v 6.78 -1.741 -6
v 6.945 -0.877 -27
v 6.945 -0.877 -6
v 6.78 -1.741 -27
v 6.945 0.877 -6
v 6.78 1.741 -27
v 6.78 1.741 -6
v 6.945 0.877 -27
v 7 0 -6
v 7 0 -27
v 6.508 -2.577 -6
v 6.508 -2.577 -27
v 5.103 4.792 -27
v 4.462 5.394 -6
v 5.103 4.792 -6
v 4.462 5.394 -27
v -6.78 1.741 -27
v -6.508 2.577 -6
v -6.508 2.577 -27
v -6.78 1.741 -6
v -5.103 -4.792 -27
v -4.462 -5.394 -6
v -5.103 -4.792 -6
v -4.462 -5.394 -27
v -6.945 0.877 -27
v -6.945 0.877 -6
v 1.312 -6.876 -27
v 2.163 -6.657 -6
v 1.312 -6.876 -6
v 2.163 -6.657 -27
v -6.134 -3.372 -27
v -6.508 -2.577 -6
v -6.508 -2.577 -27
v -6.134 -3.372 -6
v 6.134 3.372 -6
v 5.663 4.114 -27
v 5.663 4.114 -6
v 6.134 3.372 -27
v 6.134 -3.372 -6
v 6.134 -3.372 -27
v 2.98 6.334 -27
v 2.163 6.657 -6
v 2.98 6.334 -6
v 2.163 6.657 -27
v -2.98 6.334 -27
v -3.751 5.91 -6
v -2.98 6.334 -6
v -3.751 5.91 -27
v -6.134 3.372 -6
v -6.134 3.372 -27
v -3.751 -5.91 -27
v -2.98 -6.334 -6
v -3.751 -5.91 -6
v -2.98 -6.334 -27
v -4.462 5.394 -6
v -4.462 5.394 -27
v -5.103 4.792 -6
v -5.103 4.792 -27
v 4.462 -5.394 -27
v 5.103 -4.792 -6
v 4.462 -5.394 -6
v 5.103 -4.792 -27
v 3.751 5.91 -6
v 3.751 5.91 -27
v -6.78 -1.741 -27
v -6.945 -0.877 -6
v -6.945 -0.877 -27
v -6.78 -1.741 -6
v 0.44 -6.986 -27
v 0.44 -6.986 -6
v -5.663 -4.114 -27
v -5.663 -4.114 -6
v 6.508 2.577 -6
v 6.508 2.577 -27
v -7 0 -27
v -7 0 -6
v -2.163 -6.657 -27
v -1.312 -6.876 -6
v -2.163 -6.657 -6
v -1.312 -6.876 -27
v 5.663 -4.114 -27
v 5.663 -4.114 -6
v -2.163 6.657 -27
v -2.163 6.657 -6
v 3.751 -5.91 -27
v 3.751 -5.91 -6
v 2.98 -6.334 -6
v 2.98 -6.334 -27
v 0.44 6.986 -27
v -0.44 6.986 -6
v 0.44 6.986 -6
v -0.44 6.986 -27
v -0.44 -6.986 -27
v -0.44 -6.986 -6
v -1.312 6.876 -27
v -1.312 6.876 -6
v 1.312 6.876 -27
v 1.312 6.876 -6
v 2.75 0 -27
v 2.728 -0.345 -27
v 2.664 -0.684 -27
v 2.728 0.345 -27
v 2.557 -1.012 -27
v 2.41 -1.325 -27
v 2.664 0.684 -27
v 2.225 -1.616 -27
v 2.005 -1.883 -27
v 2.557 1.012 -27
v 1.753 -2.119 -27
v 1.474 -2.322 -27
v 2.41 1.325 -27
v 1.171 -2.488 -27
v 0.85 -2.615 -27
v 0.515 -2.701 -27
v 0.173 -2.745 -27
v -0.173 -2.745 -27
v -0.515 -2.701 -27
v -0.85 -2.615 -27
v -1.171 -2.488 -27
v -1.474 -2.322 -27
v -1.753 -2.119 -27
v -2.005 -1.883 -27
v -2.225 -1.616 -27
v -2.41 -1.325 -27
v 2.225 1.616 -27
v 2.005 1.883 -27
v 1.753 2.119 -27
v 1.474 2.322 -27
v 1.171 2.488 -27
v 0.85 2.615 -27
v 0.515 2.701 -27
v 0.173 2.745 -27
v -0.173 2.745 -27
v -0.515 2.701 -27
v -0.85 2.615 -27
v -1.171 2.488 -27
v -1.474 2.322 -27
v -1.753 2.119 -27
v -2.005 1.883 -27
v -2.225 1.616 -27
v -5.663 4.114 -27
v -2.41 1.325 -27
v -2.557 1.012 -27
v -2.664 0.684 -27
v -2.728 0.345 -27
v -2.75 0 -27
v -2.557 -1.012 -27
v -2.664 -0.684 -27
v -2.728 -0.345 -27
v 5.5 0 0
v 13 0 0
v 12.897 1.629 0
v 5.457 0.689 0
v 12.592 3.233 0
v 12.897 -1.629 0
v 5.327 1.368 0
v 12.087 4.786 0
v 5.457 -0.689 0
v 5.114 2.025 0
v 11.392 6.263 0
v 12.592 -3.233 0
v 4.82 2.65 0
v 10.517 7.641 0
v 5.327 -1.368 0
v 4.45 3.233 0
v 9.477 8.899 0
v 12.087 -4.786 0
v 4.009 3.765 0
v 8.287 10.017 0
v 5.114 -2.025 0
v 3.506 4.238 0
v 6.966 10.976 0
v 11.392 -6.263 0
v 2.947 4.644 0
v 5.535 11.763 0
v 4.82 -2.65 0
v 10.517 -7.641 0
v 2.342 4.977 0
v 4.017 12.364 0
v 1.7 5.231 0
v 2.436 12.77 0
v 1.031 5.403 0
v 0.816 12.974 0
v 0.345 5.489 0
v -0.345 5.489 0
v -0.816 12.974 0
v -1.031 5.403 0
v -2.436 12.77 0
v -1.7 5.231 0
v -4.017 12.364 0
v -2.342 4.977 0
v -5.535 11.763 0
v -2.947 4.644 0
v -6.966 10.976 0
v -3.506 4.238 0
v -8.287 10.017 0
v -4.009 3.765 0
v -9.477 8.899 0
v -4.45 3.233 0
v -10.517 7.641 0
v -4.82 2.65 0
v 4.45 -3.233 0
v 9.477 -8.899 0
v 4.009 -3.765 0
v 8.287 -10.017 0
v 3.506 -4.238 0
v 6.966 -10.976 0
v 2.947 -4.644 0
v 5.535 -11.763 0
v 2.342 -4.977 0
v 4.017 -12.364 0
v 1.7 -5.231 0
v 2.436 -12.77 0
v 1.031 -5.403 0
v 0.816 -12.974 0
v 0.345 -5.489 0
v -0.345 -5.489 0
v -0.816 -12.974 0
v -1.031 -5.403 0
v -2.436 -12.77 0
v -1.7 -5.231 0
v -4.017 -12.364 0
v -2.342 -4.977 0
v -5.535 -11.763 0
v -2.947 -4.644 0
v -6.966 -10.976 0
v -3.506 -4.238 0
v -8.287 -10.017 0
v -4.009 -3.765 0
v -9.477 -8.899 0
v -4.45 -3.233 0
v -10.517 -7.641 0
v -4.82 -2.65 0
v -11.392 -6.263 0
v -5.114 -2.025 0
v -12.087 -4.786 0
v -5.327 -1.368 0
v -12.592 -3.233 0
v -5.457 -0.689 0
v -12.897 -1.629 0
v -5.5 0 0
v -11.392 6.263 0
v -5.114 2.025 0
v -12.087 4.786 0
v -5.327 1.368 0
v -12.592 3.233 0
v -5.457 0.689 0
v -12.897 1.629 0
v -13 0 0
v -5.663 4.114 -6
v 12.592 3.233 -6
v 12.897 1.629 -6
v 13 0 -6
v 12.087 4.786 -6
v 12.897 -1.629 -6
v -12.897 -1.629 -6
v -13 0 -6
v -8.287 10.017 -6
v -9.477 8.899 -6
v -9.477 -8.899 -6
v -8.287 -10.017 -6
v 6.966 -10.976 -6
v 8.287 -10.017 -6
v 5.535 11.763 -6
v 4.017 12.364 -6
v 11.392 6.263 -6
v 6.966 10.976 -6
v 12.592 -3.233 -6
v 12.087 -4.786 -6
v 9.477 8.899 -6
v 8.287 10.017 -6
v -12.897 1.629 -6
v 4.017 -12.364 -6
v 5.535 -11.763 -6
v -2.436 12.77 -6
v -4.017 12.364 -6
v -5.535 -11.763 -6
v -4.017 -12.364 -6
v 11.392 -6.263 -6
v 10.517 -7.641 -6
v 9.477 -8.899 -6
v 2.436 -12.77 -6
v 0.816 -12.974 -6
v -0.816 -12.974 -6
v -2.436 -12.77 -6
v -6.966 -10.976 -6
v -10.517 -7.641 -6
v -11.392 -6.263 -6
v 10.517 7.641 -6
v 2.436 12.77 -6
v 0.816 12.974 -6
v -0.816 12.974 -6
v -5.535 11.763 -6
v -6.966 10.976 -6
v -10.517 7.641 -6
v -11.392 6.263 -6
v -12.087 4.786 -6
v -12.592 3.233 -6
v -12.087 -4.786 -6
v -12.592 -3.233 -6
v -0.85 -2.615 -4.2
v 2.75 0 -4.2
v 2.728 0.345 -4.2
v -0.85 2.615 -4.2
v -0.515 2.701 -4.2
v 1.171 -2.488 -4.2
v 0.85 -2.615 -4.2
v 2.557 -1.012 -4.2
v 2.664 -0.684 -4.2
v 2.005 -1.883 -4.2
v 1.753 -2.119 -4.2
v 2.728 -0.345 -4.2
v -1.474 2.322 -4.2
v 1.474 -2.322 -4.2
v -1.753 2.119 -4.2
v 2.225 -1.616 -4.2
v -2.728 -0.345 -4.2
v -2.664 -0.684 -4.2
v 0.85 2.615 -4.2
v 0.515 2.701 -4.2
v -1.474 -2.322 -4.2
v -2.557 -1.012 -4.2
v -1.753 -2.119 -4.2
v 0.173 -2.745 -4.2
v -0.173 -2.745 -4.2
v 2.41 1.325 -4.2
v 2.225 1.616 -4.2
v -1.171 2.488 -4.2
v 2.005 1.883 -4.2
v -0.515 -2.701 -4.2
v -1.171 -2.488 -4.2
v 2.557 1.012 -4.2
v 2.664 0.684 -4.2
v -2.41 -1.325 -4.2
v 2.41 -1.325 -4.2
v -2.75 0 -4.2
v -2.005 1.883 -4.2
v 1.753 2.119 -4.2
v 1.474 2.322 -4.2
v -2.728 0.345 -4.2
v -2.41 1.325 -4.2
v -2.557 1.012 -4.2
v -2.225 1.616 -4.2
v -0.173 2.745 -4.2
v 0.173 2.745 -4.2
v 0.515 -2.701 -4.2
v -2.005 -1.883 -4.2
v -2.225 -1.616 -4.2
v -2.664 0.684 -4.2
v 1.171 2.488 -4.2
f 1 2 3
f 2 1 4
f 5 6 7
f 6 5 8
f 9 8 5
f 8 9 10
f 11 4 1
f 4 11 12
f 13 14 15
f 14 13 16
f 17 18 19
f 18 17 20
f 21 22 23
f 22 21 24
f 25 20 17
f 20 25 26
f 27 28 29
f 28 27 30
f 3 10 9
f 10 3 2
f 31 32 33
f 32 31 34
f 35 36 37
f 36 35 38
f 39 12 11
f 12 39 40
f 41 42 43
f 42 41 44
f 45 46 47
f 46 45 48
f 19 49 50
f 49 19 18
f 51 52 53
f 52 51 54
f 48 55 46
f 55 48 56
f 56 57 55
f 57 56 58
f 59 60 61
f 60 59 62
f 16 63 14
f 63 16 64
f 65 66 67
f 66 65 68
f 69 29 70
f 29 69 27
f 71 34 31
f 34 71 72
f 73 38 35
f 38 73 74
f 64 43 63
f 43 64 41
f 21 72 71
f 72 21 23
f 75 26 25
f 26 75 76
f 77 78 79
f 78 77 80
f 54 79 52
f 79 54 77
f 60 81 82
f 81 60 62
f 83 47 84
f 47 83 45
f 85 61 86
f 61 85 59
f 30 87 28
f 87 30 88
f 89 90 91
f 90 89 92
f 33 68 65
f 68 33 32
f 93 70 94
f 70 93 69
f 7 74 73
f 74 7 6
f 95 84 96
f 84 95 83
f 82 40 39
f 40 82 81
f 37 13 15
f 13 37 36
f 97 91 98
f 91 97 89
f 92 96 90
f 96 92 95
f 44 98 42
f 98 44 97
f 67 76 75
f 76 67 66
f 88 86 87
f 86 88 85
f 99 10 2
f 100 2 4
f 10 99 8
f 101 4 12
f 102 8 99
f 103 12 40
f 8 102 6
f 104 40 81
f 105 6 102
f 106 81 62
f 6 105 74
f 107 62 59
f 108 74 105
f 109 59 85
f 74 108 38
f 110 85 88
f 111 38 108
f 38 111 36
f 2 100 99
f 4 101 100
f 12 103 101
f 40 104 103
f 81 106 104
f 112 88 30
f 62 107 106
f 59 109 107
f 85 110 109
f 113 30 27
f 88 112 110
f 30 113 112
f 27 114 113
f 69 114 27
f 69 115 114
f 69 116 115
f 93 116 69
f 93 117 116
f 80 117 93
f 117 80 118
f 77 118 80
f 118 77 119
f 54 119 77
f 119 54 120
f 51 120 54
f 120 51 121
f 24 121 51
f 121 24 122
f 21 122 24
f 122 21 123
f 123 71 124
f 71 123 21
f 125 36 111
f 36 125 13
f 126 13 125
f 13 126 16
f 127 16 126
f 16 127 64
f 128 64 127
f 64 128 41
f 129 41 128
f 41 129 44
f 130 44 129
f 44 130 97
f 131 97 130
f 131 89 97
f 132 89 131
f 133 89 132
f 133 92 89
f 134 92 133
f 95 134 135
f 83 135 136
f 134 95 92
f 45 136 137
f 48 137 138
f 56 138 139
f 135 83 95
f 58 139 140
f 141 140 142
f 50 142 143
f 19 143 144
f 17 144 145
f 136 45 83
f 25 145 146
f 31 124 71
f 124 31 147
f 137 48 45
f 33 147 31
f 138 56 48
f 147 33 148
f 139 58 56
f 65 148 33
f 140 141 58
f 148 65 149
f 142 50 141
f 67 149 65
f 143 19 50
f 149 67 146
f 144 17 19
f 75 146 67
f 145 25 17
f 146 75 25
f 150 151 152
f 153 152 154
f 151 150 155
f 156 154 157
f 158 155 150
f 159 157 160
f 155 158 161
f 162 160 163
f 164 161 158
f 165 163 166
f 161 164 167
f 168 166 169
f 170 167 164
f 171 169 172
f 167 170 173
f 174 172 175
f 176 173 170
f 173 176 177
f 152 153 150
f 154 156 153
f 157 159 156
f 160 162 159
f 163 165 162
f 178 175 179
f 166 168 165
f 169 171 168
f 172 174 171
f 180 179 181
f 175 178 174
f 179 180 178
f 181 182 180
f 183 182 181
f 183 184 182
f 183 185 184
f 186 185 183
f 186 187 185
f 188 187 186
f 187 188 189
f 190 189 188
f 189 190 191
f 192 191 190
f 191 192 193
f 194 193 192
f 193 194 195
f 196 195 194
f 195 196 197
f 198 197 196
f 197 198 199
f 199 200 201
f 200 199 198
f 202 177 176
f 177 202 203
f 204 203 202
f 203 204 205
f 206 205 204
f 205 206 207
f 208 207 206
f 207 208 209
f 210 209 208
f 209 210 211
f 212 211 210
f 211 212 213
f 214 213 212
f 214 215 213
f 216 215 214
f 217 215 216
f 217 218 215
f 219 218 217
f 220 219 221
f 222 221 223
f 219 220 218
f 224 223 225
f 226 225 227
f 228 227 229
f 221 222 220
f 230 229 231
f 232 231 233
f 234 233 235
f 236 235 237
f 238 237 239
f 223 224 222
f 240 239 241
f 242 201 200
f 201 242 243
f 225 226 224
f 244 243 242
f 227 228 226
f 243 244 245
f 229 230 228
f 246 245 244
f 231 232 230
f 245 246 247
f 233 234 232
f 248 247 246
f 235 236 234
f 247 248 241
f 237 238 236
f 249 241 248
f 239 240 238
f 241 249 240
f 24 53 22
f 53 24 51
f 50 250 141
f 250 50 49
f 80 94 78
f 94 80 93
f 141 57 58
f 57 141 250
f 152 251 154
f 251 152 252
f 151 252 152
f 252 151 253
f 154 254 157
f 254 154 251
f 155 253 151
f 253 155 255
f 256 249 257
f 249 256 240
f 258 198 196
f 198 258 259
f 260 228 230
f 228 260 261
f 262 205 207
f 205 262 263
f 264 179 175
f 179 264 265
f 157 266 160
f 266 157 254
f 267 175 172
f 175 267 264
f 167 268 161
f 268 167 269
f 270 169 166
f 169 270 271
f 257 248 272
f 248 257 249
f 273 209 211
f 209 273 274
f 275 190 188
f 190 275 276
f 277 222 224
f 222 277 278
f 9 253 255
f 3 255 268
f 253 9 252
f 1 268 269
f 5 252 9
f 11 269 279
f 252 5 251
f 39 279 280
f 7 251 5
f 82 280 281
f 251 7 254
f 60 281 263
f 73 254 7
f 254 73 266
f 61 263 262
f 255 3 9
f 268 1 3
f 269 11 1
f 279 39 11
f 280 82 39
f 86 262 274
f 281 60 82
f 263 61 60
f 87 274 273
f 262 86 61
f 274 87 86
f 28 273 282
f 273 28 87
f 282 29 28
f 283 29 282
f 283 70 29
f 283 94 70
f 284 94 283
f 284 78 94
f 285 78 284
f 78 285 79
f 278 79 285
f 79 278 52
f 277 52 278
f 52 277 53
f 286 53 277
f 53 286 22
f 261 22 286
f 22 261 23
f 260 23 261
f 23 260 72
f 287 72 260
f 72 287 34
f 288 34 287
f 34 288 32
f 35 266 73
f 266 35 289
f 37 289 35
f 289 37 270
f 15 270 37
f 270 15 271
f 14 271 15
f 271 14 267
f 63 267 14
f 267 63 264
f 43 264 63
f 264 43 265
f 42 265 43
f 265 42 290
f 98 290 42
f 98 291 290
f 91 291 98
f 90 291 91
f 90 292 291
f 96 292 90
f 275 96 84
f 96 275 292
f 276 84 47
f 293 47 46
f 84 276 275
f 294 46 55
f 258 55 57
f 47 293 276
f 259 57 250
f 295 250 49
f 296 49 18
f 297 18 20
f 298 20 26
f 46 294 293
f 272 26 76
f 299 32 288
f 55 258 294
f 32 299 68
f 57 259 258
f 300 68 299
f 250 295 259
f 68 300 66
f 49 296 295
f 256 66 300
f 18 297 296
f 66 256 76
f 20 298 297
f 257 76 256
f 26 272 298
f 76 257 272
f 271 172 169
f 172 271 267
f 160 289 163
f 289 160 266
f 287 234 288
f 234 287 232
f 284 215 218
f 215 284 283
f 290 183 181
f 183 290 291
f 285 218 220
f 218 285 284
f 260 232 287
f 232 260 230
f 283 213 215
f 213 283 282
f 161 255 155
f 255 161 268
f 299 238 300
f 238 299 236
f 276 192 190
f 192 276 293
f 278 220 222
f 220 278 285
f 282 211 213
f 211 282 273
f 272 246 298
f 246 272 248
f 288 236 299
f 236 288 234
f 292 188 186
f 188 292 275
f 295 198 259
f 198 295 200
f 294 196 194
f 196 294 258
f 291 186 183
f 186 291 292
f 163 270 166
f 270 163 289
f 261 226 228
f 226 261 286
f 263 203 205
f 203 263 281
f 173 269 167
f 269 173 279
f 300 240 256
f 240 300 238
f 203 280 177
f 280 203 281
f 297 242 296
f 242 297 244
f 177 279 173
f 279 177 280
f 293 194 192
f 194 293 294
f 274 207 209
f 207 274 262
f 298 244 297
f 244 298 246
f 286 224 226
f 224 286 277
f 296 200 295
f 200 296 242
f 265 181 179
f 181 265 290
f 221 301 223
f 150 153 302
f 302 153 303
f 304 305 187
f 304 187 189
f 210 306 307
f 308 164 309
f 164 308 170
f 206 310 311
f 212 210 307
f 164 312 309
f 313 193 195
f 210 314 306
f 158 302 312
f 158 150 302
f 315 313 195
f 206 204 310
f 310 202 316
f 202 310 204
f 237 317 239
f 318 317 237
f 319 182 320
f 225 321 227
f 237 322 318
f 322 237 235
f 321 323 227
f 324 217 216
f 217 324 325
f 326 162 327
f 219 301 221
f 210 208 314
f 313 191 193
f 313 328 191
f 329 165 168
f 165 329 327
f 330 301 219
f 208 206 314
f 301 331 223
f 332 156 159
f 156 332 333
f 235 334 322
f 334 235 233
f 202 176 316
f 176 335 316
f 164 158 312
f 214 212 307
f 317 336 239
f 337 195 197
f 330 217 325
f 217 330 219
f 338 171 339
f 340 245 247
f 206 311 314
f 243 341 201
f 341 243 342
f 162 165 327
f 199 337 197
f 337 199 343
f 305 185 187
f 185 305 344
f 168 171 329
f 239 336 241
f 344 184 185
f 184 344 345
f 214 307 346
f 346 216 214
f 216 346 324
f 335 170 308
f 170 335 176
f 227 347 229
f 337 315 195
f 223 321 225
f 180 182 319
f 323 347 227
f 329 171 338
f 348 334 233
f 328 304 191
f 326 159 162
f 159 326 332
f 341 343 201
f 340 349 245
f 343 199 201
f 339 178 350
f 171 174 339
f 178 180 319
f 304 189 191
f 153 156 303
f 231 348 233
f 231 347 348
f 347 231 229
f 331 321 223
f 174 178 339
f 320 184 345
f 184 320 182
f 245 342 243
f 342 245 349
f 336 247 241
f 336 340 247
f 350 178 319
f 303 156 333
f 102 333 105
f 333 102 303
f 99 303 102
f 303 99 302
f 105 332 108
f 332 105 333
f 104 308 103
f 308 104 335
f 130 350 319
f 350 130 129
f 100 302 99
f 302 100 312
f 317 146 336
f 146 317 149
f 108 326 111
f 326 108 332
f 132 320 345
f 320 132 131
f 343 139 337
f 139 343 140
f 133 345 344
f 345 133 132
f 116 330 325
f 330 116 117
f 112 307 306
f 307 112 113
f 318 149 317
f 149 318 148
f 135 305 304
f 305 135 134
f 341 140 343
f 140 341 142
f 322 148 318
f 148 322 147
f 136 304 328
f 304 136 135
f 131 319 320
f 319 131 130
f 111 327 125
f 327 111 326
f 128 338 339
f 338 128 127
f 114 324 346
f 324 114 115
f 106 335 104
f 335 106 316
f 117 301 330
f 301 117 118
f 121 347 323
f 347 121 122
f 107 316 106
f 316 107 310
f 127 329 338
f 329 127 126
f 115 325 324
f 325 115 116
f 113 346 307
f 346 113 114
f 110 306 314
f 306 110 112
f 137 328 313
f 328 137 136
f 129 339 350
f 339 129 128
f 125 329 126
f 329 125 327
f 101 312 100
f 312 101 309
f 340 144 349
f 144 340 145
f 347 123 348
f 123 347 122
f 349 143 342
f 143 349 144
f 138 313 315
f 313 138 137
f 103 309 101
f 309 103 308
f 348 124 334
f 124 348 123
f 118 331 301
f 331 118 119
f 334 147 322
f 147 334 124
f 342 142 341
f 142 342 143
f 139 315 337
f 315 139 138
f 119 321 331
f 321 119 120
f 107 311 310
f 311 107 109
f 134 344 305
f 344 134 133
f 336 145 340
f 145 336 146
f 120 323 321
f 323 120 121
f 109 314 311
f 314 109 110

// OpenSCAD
$fn = 50;


difference() {
	union() {
		translate(v = [0, 0, -27.0000000000]) {
			cylinder(h = 27, r = 7.0000000000);
		}
		translate(v = [0, 0, -6.0000000000]) {
			cylinder(h = 6, r = 13.0000000000);
		}
	}
	union() {
		translate(v = [0, 0, 0]) {
			rotate(a = [0, 0, 0]) {
				difference() {
					union() {
						#translate(v = [0, 0, -27.0000000000]) {
							cylinder(h = 27, r = 2.2500000000);
						}
						#translate(v = [0, 0, -4.2000000000]) {
							cylinder(h = 4.2000000000, r = 7.0000000000, r1 = 2.7500000000, r2 = 5.5000000000);
						}
						#translate(v = [0, 0, -27.0000000000]) {
							cylinder(h = 27, r = 2.7500000000);
						}
						#translate(v = [0, 0, -27.0000000000]) {
							cylinder(h = 27, r = 2.2500000000);
						}
					}
					union();
				}
			}
		}
	}
}
